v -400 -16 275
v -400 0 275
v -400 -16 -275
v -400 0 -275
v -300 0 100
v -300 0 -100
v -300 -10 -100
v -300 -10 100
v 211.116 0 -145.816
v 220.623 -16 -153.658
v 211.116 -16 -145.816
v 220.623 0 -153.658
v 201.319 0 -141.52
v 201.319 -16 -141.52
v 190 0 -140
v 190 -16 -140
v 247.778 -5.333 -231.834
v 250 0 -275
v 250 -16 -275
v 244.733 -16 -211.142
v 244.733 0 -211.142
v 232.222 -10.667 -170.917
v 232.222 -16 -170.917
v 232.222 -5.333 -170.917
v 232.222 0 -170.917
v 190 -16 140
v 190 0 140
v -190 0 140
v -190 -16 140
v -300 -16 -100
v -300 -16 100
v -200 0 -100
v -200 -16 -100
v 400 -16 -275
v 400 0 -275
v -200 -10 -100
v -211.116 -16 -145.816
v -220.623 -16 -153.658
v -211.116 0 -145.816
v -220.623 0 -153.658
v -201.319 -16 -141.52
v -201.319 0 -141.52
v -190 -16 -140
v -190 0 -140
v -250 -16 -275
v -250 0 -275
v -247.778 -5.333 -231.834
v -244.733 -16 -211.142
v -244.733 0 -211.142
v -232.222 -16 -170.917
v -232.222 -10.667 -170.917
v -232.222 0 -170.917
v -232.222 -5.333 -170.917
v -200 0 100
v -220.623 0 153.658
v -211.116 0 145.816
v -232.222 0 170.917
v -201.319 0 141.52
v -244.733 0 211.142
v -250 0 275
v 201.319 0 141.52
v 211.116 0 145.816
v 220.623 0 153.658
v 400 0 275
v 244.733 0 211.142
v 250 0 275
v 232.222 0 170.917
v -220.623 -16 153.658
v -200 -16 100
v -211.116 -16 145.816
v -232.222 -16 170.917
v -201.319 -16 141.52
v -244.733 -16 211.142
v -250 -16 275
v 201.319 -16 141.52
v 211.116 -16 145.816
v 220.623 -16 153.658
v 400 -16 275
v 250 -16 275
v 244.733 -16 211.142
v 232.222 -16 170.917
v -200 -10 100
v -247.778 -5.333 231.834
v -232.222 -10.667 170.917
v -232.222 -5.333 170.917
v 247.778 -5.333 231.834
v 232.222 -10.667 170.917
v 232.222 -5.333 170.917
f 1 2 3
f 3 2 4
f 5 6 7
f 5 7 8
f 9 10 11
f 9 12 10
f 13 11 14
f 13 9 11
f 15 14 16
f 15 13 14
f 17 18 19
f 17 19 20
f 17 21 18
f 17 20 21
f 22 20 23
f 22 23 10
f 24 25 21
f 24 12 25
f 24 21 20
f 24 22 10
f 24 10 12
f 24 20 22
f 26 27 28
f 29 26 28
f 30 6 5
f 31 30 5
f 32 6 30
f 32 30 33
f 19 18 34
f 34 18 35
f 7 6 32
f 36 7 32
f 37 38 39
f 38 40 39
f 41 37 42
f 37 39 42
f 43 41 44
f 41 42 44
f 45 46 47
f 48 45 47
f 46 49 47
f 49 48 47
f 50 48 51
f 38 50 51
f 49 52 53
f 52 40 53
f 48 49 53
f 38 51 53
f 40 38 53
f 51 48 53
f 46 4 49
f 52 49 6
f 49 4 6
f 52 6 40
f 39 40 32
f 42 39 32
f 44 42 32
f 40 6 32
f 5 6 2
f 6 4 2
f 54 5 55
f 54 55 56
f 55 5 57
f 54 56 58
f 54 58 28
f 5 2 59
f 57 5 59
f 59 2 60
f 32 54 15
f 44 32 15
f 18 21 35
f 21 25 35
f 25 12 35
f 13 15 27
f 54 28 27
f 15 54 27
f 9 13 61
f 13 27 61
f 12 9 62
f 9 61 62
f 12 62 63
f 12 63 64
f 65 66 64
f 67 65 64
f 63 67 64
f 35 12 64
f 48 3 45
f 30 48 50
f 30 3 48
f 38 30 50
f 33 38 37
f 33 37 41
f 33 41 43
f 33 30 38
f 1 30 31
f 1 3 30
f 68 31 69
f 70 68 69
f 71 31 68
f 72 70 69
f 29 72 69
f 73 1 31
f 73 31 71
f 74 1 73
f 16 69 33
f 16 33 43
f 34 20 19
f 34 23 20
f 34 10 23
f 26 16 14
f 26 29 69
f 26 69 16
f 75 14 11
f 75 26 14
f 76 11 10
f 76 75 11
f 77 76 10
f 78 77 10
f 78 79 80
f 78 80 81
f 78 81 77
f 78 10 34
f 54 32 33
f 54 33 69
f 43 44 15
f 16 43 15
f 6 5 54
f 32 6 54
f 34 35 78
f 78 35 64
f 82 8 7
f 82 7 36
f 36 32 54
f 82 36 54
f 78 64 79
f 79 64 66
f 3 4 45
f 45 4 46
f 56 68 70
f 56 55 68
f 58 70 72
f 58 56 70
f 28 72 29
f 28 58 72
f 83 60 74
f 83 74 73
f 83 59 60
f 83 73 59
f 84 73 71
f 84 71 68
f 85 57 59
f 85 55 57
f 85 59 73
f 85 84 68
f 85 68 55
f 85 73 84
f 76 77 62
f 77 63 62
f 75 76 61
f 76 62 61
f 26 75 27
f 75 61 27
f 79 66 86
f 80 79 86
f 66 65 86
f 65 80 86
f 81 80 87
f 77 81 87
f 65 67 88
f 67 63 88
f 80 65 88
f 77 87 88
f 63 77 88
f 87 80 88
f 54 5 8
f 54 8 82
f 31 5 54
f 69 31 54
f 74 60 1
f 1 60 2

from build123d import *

# Parameters (mm, degrees)
F0_W     = 100
F0_H     = 200
F1_DEPTH = 16
F2_DEPTH = 10


# Not quite as in the source:
# - a feature names something its author has since deleted; it is built from what else it names


with BuildPart() as f1:
    # F0 (on Front) → F1 (new body)
    with BuildSketch(Plane.XZ):
        Polygon((-250, 275), (-400, 275), (-400, -275), (-250, -275), (-250, -140), (-190, -140), (190, -140), (250, -140), (250, -275), (400, -275), (400, 275), (250, 275), (250, 140), (190, 140), (-190, 140), (-250, 140), align=None)
        with Locations((-250, 0)):
            Rectangle(F0_W, F0_H, mode=Mode.SUBTRACT)
        with BuildLine():
            add(Edge.make_bspline(
                [(-250, 275), (-250, 256.6260014103), (-250, 140), (-190, 140)],
                knots=[0, 0, 0, 0, 147.7328670269, 147.7328670269, 147.7328670269, 147.7328670269], degree=3))
            Line((-250, 275), (-250, 140))
            Line((-250, 140), (-190, 140))
        make_face()
        with BuildLine():
            Line((250, 140), (250, 275))
            add(Edge.make_bspline(
                [(250, 275), (250, 256.6260014103), (250, 140), (190, 140)],
                knots=[0, 0, 0, 0, 147.7328670269, 147.7328670269, 147.7328670269, 147.7328670269], degree=3))
            Line((190, 140), (250, 140))
        make_face()
        with BuildLine():
            Line((-250, -140), (-250, -275))
            add(Edge.make_bspline(
                [(-250, -275), (-250, -256.6260014103), (-250, -140), (-190, -140)],
                knots=[0, 0, 0, 0, 147.7328670269, 147.7328670269, 147.7328670269, 147.7328670269], degree=3))
            Line((-190, -140), (-250, -140))
        make_face()
        with BuildLine():
            add(Edge.make_bspline(
                [(250, -275), (250, -256.6260014103), (250, -140), (190, -140)],
                knots=[0, 0, 0, 0, 147.7328670269, 147.7328670269, 147.7328670269, 147.7328670269], degree=3))
            Line((250, -275), (250, -140))
            Line((250, -140), (190, -140))
        make_face()
    extrude(amount=F1_DEPTH)


with BuildPart() as f2:
    # F0 (on Front) → F2 (new body)
    with BuildSketch(Plane.XZ):
        with Locations((-250, 0)):
            Rectangle(F0_W, F0_H)
    extrude(amount=F2_DEPTH)


solid = Compound([f1.part, f2.part])
